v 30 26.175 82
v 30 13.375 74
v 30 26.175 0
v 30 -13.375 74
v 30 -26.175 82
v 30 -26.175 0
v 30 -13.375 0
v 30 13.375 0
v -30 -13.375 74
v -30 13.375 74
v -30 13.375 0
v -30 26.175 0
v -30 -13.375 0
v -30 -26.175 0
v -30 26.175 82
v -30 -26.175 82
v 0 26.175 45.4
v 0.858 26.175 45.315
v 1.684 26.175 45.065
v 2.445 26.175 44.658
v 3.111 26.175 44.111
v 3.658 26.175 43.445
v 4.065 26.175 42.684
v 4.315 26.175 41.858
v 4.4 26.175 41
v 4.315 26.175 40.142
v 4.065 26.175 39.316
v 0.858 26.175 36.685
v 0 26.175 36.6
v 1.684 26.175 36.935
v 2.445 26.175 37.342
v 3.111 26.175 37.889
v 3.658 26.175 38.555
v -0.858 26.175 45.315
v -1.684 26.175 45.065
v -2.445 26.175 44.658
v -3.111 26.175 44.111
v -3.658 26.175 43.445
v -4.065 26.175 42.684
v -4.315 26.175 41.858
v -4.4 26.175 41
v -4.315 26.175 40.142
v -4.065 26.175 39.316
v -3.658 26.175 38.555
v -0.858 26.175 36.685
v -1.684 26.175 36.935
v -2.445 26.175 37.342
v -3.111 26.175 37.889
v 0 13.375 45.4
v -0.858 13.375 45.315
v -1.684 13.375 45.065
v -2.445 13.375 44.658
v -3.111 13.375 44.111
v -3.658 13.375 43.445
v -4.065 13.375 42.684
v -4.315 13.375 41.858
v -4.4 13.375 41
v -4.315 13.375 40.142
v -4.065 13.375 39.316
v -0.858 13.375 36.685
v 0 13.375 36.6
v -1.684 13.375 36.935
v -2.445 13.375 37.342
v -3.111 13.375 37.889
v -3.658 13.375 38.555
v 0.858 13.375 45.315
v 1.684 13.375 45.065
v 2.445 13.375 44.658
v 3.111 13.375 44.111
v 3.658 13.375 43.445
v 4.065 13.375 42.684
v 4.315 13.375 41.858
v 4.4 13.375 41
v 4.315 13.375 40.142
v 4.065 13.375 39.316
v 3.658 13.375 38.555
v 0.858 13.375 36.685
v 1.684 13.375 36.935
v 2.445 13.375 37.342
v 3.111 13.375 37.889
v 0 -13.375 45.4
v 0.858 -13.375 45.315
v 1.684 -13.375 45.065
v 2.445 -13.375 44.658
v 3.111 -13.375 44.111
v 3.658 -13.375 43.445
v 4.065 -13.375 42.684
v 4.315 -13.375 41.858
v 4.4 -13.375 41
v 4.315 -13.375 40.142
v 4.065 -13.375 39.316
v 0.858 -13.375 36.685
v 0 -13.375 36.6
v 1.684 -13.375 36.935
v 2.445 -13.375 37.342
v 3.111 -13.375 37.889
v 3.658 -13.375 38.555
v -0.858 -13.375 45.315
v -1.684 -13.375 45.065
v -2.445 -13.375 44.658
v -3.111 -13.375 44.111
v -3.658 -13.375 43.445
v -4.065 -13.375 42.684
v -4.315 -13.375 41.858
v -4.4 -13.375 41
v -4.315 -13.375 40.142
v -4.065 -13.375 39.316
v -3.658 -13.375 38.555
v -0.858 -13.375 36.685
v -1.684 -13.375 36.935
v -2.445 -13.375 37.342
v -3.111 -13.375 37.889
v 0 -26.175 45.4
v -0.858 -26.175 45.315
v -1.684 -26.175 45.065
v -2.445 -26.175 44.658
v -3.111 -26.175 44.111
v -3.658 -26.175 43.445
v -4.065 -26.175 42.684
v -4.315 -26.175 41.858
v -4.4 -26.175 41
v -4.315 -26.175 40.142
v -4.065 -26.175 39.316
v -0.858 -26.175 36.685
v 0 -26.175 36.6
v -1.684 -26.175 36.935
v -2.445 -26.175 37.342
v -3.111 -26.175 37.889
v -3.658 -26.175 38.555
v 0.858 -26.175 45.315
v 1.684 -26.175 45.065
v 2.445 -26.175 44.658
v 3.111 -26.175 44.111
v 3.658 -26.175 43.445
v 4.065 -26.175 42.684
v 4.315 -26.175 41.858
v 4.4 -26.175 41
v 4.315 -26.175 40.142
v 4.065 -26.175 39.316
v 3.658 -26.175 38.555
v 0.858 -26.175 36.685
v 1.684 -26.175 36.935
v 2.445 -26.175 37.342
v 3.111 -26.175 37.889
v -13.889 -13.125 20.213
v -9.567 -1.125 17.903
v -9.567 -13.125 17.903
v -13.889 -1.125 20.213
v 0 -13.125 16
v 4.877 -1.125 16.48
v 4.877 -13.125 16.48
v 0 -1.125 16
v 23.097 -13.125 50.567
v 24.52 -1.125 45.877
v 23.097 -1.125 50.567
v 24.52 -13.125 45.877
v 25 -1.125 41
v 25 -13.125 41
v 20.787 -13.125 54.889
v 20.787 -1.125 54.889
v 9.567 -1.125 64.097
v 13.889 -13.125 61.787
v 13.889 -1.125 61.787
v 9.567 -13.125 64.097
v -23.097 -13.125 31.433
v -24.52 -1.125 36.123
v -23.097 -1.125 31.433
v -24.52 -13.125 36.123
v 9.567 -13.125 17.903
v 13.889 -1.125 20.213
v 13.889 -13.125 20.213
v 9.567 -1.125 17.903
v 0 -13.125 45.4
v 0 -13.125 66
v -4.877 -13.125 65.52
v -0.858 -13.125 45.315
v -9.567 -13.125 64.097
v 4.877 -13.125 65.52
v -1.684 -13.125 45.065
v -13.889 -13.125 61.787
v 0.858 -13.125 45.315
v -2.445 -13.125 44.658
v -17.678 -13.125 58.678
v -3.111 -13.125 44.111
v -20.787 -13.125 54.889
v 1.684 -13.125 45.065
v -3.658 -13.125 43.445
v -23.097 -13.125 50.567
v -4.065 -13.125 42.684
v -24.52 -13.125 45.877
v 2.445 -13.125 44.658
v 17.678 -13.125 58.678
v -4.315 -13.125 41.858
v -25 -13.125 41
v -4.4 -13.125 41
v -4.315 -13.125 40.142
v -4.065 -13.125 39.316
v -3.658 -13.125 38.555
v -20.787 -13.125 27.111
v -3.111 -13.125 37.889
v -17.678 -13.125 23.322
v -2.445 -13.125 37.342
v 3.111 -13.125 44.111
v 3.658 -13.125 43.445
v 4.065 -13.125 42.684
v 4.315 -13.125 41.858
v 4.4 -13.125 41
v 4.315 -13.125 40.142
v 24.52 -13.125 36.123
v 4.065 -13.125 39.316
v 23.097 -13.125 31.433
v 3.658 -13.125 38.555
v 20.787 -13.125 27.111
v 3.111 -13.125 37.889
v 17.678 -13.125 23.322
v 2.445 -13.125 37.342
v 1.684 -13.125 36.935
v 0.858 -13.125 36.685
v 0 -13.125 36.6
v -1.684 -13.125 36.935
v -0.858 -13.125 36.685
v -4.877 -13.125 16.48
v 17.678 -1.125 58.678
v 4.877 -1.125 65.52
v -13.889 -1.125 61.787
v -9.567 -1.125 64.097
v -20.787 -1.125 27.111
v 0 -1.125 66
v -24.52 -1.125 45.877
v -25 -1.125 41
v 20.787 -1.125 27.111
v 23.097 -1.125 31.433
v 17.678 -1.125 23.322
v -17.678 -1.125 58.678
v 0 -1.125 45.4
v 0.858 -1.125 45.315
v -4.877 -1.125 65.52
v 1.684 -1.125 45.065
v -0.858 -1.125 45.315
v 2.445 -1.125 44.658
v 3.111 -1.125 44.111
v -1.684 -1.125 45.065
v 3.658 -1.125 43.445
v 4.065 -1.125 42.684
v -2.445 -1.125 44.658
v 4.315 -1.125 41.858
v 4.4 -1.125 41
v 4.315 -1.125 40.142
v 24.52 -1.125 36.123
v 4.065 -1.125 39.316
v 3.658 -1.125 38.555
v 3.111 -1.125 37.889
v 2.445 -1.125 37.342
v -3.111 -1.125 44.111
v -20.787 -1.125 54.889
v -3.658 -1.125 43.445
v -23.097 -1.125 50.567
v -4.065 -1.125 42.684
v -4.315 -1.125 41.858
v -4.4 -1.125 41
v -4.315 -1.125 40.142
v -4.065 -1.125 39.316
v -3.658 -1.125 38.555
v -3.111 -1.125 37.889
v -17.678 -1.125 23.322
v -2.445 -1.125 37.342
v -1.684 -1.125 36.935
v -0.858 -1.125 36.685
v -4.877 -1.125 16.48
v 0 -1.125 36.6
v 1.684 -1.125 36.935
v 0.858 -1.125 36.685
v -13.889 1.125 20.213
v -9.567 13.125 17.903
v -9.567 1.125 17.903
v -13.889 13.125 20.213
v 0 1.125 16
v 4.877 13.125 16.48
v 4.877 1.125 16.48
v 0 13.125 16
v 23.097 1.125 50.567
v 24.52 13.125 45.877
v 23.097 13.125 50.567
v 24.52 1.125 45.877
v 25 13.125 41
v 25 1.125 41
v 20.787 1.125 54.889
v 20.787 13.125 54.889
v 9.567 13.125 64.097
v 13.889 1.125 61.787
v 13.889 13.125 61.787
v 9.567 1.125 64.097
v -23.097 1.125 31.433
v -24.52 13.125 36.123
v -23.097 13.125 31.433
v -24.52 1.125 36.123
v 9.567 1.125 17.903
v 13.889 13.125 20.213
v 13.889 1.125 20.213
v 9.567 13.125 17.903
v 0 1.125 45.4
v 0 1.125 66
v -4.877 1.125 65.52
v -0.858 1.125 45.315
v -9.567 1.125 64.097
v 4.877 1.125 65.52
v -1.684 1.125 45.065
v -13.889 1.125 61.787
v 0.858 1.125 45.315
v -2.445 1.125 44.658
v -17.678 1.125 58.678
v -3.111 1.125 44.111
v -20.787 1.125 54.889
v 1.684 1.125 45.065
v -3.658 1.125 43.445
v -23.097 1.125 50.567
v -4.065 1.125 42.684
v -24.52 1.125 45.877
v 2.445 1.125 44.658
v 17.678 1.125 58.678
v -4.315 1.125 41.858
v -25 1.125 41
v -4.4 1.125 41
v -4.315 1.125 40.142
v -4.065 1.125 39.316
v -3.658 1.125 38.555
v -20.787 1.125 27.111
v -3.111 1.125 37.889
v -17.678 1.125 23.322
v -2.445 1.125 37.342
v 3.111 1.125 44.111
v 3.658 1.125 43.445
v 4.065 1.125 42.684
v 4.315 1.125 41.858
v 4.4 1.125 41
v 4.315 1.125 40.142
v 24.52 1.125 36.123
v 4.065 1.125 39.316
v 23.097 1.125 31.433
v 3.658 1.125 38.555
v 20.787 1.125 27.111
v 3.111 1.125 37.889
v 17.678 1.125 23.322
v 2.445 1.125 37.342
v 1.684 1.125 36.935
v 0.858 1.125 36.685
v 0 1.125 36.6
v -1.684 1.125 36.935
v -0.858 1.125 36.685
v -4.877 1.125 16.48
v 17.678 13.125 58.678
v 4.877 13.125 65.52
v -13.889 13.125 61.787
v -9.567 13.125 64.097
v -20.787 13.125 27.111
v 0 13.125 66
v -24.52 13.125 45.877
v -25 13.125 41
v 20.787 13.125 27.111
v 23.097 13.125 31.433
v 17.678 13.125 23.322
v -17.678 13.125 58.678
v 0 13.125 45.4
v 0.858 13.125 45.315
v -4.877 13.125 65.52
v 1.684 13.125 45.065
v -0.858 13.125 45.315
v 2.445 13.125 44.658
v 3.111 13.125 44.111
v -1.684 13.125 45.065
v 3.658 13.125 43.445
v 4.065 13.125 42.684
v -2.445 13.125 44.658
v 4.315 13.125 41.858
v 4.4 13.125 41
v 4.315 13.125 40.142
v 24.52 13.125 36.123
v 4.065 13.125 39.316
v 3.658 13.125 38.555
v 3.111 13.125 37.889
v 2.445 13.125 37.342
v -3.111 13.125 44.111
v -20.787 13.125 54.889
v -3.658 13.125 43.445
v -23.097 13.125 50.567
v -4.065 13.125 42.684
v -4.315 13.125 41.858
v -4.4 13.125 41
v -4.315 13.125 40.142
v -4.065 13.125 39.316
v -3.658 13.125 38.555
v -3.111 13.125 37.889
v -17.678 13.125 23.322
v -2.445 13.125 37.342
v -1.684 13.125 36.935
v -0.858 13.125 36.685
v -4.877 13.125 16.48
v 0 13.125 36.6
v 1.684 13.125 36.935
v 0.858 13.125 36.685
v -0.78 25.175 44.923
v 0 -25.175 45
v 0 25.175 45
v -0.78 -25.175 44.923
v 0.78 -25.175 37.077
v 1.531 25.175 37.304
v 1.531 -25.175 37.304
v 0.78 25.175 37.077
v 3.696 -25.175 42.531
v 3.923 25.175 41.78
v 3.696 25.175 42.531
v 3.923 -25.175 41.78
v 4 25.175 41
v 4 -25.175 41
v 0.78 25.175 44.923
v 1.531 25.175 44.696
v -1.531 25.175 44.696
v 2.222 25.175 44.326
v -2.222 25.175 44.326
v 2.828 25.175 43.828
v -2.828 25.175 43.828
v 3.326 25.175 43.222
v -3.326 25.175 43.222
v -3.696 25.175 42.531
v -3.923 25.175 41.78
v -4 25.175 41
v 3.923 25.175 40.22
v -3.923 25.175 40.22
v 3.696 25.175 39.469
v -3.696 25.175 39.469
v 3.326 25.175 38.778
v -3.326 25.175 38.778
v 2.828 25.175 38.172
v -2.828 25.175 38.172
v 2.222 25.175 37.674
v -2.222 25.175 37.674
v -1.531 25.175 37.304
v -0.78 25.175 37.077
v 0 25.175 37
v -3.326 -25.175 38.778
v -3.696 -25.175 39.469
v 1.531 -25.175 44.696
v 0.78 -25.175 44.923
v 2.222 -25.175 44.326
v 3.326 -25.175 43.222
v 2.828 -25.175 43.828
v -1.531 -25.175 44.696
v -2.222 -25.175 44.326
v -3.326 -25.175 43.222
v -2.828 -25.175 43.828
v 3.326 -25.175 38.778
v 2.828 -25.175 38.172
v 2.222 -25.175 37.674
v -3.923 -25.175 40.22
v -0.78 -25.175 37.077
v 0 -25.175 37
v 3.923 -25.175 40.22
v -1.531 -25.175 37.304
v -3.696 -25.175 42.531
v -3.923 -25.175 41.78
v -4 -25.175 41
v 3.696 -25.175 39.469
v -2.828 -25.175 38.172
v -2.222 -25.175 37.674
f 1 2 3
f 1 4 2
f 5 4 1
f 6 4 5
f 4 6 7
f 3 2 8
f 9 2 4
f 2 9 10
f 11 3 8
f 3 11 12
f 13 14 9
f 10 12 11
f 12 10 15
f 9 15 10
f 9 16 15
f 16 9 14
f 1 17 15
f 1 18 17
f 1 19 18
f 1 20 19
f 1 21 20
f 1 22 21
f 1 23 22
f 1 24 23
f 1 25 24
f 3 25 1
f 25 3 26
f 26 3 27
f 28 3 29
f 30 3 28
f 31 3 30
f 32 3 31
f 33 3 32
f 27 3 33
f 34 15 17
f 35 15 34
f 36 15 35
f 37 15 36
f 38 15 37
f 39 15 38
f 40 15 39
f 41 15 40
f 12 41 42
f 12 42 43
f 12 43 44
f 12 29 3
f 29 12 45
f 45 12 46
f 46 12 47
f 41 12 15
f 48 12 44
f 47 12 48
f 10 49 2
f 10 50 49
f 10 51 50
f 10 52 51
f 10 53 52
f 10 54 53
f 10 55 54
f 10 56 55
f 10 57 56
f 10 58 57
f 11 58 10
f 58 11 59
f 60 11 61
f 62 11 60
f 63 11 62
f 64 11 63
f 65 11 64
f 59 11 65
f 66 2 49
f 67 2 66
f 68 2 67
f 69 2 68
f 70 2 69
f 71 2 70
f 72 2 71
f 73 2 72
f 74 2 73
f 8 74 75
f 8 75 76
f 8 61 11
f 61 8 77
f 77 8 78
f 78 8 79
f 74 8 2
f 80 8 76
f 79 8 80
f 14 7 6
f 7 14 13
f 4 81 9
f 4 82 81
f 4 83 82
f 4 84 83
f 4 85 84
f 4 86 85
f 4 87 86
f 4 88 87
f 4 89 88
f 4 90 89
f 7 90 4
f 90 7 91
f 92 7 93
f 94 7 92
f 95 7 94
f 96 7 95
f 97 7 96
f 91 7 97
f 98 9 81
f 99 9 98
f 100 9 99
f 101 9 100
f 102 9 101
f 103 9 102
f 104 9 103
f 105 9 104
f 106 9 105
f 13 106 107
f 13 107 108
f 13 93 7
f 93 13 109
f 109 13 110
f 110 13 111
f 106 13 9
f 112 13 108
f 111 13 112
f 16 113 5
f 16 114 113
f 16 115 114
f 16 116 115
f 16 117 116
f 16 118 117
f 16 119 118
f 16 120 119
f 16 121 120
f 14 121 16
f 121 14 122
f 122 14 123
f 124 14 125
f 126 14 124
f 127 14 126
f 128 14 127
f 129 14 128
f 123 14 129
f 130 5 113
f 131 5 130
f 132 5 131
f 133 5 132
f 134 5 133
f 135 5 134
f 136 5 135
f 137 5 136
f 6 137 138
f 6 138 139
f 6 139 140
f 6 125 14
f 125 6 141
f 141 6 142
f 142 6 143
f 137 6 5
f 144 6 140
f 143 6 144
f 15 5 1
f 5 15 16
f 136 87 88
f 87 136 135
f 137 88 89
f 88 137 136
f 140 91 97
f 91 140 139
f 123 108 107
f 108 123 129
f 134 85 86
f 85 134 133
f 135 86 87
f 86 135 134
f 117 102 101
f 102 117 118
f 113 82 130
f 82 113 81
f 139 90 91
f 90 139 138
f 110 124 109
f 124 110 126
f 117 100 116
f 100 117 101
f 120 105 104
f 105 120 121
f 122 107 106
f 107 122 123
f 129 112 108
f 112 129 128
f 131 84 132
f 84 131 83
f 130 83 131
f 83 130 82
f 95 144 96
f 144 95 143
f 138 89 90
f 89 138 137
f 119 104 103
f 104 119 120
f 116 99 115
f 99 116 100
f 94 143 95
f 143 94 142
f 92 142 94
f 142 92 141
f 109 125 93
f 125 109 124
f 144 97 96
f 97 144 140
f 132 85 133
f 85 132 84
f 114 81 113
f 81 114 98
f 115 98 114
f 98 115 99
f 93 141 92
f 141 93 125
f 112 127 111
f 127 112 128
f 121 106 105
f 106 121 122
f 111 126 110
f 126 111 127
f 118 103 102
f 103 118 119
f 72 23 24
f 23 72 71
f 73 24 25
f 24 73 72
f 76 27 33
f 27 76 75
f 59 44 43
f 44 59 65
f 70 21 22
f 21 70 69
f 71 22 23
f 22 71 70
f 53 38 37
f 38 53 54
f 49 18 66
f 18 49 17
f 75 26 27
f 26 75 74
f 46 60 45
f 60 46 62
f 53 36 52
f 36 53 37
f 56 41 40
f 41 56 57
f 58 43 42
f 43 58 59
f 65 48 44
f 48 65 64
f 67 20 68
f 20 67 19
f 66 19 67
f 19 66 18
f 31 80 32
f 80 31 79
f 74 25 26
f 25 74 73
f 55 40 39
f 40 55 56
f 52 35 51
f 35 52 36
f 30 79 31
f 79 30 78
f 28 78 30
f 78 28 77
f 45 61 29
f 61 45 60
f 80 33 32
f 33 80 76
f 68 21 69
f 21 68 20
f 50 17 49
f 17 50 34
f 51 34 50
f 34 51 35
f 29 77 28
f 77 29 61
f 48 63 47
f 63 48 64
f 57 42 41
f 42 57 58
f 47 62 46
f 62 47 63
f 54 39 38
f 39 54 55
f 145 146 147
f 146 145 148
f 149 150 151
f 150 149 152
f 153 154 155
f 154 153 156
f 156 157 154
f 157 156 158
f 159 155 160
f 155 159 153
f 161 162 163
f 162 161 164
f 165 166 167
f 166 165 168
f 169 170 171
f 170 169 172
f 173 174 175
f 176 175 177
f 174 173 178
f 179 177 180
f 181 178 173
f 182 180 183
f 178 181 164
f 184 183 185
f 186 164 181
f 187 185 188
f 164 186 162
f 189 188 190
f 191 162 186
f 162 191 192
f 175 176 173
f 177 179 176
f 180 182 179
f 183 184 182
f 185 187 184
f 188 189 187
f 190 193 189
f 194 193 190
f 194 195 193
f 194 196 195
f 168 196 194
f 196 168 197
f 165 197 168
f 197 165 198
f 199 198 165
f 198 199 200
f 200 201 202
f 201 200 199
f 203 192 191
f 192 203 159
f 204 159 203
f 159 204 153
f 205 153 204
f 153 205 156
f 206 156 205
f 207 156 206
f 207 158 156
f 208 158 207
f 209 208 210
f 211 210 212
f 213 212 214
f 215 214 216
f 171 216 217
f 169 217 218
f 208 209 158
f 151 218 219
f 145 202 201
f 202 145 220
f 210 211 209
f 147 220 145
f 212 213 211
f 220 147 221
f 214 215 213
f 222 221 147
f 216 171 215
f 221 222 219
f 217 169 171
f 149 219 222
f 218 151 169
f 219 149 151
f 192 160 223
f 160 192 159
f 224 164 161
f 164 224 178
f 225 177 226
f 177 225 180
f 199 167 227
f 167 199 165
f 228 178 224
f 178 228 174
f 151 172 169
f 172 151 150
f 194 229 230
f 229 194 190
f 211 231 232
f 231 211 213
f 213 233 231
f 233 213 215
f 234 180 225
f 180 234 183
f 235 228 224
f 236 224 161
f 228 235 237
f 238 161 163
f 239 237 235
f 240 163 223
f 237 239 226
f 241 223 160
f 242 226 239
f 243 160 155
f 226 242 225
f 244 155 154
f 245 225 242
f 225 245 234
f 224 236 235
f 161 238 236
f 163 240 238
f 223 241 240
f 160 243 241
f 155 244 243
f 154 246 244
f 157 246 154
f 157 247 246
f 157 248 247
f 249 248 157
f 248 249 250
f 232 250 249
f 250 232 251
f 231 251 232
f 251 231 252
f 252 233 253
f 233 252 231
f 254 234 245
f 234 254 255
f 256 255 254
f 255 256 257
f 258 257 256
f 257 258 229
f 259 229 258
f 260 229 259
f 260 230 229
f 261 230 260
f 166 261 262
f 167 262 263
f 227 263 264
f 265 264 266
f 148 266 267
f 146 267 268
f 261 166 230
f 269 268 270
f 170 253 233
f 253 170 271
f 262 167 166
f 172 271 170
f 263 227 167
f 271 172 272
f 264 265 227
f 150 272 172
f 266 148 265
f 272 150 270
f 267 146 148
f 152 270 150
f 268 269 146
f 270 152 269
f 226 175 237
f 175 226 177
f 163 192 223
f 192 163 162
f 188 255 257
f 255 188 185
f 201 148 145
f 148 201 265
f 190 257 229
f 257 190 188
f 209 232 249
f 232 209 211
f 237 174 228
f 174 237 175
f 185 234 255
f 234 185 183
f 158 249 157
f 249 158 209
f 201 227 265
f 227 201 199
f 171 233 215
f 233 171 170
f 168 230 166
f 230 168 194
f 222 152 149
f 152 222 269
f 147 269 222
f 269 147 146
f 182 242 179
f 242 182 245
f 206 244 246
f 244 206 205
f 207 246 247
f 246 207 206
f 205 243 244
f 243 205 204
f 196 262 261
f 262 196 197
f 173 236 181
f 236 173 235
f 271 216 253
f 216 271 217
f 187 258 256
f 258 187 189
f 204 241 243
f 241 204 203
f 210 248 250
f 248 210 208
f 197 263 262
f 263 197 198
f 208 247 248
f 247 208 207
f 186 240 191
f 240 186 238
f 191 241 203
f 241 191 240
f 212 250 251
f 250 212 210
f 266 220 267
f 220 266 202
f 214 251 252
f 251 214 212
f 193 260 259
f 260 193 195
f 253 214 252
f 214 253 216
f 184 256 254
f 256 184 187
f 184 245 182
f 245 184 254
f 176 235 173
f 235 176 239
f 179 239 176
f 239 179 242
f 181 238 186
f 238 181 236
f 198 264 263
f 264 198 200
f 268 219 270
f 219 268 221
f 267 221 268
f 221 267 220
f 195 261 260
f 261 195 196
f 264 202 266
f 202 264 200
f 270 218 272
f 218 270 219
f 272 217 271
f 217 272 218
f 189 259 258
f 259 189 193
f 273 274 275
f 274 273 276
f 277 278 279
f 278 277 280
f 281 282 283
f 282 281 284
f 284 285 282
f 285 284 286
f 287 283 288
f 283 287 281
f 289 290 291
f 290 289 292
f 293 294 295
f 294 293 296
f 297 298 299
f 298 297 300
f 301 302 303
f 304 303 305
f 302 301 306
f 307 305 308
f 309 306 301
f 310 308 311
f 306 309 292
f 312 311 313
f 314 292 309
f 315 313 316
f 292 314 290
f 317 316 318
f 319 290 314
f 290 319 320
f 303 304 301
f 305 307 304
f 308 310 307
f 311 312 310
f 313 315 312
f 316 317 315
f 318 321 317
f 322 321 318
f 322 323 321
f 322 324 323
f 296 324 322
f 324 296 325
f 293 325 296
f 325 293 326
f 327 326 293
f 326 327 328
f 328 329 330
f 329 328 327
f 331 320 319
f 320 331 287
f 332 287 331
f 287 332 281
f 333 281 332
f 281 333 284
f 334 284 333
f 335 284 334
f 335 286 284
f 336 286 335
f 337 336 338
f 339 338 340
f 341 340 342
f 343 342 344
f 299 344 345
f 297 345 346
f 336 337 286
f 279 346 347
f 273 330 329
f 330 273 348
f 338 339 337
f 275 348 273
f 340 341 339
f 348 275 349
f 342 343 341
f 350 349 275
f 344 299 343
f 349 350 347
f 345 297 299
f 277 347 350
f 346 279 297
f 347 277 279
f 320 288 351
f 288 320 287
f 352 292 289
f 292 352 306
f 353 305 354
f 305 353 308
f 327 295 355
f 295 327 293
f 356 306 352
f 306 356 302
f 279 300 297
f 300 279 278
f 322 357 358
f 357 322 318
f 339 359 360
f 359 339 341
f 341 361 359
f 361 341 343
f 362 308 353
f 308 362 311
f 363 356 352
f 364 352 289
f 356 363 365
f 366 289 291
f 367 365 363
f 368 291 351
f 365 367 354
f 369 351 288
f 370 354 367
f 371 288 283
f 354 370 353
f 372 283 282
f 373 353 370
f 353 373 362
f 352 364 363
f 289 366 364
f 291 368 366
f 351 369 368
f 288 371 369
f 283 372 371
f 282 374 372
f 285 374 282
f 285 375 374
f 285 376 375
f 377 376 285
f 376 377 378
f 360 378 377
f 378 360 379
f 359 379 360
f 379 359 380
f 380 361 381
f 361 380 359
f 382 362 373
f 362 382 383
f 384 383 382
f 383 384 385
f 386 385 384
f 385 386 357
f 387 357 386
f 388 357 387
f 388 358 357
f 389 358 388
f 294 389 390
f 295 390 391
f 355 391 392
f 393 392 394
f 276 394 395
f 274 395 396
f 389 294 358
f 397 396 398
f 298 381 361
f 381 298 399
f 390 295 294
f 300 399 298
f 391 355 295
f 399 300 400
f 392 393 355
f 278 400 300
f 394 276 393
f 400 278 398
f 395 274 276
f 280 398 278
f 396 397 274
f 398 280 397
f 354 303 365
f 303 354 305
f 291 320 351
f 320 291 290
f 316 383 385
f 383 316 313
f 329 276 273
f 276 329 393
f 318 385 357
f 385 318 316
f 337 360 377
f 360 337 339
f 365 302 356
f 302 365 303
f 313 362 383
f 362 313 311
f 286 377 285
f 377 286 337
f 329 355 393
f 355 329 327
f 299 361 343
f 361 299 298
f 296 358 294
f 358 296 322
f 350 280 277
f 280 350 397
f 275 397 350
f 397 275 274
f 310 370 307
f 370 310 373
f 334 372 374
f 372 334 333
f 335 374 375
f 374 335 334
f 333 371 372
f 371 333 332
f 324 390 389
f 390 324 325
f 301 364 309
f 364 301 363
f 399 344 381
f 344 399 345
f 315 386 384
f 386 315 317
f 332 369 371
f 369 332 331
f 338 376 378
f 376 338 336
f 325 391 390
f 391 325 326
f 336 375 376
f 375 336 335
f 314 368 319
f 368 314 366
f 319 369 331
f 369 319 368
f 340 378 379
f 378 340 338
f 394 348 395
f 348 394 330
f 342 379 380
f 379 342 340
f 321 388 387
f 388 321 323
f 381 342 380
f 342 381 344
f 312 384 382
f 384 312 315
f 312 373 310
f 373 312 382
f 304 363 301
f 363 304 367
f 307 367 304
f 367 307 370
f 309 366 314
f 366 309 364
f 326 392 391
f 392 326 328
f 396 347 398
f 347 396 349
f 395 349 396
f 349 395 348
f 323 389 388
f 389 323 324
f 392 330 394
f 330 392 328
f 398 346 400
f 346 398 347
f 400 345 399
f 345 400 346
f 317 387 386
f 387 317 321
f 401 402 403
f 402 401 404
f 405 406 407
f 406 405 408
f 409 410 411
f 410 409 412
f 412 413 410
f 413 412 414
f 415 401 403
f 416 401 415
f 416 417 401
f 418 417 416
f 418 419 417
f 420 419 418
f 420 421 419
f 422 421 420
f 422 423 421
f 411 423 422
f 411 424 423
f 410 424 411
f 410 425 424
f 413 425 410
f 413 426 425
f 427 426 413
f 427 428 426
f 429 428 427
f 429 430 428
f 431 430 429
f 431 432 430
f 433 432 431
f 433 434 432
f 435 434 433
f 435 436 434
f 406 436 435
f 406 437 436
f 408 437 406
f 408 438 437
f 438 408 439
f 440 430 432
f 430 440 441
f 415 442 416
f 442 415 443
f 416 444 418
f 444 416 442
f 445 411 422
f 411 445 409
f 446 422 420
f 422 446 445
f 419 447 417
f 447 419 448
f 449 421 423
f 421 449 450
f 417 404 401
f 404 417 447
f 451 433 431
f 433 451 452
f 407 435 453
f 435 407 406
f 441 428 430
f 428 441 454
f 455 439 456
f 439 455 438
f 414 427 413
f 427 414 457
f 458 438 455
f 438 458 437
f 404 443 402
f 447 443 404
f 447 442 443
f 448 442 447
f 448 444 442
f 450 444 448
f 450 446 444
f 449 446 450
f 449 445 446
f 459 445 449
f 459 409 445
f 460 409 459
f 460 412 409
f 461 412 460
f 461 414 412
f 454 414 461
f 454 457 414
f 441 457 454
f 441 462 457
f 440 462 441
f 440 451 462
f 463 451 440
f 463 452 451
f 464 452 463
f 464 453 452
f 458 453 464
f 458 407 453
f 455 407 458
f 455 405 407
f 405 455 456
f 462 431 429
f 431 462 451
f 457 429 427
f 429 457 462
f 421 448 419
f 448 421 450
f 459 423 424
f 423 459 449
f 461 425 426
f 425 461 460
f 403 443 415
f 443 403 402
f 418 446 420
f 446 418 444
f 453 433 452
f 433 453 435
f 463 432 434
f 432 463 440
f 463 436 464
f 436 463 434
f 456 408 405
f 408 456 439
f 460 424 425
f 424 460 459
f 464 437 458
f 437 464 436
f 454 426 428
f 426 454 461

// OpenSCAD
$fn = 32;

// ------------------------------------------------------------------------
// Trolley wheel set: wheels d50, fork 74 mm tall
// Every part is its own module, assembly() places every instance.
// ------------------------------------------------------------------------

// --- part 1 ---
module trolley_fork() {
  difference() {
    union() {
      translate([-30, 13.375, 0]) cube([60, 12.8, 74]);
      translate([-30, -26.175, 0]) cube([60, 12.8, 74]);
      translate([-30, -26.175, 74]) cube([60, 52.35, 8]);
    }
    translate([0, -19.775, 41]) rotate([90, 0, 0]) cylinder(h = 14.8, d = 8.8, center = true);
    translate([0, 19.775, 41]) rotate([90, 0, 0]) cylinder(h = 14.8, d = 8.8, center = true);
  }
}

// --- part 2 ---
module trolley_wheel() {
  difference() {
      translate([0, 0, 0]) cylinder(h = 12, d = 50);
      translate([0, 0, -1]) cylinder(h = 14, d = 8.8);
    }
}

// --- part 3 ---
module trolley_axle() {
  translate([0, 0, -25.175]) cylinder(h = 50.35, d = 8);
}

// --- assembly ---
module assembly() {
  color([0.80, 0.24, 0.20]) translate([0, 0, 0]) rotate([0, 0, 0]) trolley_fork();
  color([0.20, 0.45, 0.75]) translate([0, -1.125, 41]) rotate([90, 0, 0]) trolley_wheel();
  color([0.25, 0.62, 0.32]) translate([0, 13.125, 41]) rotate([90, 0, 0]) trolley_wheel();
  color([0.92, 0.70, 0.18]) translate([0, 0, 41]) rotate([90, 0, 0]) trolley_axle();
}

assembly();
